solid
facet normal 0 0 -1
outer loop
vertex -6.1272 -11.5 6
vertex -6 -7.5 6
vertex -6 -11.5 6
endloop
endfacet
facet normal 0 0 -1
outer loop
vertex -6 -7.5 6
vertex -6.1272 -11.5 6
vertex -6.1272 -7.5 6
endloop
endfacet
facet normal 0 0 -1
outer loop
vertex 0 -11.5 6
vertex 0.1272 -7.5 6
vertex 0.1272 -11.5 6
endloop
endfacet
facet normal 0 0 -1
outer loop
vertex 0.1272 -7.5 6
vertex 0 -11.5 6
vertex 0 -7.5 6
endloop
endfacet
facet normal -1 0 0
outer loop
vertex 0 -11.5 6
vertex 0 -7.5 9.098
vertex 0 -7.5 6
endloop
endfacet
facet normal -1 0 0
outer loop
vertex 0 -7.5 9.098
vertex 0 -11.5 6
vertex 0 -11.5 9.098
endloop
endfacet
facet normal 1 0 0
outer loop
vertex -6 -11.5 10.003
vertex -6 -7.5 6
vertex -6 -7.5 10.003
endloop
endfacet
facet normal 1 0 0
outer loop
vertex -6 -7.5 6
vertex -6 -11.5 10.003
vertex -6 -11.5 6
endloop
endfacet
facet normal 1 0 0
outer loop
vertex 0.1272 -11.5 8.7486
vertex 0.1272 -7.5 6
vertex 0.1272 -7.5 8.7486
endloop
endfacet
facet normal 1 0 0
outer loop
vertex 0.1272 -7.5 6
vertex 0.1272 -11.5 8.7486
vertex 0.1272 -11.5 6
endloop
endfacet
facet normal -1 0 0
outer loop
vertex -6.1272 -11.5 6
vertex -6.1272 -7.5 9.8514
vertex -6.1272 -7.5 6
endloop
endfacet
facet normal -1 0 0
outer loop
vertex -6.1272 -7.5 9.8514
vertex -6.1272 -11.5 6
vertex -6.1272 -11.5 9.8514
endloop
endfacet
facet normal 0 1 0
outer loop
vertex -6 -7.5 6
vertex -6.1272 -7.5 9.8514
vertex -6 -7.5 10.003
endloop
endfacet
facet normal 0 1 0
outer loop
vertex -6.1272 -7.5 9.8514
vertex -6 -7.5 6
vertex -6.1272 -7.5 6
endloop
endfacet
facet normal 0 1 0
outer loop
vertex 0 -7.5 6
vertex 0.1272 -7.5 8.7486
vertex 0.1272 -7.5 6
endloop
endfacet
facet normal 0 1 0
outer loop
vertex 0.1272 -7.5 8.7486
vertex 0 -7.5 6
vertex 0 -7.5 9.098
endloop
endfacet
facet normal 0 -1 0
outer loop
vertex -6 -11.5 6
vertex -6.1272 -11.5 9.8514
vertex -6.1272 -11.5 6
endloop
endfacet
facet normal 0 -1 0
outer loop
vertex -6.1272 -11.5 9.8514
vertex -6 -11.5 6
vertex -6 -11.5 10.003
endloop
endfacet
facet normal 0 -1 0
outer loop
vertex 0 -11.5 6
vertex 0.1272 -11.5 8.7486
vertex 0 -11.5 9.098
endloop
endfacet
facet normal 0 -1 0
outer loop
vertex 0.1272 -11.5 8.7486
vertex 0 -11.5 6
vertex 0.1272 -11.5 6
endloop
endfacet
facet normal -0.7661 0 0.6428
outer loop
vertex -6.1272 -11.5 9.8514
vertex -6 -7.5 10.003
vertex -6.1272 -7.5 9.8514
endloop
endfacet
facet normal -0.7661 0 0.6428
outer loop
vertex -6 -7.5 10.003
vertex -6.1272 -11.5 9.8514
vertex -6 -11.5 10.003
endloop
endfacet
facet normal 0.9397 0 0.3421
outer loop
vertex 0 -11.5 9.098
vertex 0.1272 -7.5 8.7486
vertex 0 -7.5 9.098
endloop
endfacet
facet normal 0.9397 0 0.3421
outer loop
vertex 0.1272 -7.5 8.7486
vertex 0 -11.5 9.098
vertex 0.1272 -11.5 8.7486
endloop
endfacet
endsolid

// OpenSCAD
// The back X lock nut must not spin: a real nut (5.5 AF) turned 20 deg
// from corner-down, swept down through the open bottom of its pocket,
// must hit the pocket walls. Must render NON-empty.
include <../stage.scad>
af = 5.5;
z = stage_base_h + xs_lock_z;
intersection() {
  stage_x_slider();
  hull() for (dz = [0, -5])
    translate([xs_xc, xs_back_nut_y, z + dz]) rotate([90, 0, 0]) rotate([0, 0, 90 + 20])
      cylinder(d = af / cos(30), h = 4, center = true, $fn = 6);
}
